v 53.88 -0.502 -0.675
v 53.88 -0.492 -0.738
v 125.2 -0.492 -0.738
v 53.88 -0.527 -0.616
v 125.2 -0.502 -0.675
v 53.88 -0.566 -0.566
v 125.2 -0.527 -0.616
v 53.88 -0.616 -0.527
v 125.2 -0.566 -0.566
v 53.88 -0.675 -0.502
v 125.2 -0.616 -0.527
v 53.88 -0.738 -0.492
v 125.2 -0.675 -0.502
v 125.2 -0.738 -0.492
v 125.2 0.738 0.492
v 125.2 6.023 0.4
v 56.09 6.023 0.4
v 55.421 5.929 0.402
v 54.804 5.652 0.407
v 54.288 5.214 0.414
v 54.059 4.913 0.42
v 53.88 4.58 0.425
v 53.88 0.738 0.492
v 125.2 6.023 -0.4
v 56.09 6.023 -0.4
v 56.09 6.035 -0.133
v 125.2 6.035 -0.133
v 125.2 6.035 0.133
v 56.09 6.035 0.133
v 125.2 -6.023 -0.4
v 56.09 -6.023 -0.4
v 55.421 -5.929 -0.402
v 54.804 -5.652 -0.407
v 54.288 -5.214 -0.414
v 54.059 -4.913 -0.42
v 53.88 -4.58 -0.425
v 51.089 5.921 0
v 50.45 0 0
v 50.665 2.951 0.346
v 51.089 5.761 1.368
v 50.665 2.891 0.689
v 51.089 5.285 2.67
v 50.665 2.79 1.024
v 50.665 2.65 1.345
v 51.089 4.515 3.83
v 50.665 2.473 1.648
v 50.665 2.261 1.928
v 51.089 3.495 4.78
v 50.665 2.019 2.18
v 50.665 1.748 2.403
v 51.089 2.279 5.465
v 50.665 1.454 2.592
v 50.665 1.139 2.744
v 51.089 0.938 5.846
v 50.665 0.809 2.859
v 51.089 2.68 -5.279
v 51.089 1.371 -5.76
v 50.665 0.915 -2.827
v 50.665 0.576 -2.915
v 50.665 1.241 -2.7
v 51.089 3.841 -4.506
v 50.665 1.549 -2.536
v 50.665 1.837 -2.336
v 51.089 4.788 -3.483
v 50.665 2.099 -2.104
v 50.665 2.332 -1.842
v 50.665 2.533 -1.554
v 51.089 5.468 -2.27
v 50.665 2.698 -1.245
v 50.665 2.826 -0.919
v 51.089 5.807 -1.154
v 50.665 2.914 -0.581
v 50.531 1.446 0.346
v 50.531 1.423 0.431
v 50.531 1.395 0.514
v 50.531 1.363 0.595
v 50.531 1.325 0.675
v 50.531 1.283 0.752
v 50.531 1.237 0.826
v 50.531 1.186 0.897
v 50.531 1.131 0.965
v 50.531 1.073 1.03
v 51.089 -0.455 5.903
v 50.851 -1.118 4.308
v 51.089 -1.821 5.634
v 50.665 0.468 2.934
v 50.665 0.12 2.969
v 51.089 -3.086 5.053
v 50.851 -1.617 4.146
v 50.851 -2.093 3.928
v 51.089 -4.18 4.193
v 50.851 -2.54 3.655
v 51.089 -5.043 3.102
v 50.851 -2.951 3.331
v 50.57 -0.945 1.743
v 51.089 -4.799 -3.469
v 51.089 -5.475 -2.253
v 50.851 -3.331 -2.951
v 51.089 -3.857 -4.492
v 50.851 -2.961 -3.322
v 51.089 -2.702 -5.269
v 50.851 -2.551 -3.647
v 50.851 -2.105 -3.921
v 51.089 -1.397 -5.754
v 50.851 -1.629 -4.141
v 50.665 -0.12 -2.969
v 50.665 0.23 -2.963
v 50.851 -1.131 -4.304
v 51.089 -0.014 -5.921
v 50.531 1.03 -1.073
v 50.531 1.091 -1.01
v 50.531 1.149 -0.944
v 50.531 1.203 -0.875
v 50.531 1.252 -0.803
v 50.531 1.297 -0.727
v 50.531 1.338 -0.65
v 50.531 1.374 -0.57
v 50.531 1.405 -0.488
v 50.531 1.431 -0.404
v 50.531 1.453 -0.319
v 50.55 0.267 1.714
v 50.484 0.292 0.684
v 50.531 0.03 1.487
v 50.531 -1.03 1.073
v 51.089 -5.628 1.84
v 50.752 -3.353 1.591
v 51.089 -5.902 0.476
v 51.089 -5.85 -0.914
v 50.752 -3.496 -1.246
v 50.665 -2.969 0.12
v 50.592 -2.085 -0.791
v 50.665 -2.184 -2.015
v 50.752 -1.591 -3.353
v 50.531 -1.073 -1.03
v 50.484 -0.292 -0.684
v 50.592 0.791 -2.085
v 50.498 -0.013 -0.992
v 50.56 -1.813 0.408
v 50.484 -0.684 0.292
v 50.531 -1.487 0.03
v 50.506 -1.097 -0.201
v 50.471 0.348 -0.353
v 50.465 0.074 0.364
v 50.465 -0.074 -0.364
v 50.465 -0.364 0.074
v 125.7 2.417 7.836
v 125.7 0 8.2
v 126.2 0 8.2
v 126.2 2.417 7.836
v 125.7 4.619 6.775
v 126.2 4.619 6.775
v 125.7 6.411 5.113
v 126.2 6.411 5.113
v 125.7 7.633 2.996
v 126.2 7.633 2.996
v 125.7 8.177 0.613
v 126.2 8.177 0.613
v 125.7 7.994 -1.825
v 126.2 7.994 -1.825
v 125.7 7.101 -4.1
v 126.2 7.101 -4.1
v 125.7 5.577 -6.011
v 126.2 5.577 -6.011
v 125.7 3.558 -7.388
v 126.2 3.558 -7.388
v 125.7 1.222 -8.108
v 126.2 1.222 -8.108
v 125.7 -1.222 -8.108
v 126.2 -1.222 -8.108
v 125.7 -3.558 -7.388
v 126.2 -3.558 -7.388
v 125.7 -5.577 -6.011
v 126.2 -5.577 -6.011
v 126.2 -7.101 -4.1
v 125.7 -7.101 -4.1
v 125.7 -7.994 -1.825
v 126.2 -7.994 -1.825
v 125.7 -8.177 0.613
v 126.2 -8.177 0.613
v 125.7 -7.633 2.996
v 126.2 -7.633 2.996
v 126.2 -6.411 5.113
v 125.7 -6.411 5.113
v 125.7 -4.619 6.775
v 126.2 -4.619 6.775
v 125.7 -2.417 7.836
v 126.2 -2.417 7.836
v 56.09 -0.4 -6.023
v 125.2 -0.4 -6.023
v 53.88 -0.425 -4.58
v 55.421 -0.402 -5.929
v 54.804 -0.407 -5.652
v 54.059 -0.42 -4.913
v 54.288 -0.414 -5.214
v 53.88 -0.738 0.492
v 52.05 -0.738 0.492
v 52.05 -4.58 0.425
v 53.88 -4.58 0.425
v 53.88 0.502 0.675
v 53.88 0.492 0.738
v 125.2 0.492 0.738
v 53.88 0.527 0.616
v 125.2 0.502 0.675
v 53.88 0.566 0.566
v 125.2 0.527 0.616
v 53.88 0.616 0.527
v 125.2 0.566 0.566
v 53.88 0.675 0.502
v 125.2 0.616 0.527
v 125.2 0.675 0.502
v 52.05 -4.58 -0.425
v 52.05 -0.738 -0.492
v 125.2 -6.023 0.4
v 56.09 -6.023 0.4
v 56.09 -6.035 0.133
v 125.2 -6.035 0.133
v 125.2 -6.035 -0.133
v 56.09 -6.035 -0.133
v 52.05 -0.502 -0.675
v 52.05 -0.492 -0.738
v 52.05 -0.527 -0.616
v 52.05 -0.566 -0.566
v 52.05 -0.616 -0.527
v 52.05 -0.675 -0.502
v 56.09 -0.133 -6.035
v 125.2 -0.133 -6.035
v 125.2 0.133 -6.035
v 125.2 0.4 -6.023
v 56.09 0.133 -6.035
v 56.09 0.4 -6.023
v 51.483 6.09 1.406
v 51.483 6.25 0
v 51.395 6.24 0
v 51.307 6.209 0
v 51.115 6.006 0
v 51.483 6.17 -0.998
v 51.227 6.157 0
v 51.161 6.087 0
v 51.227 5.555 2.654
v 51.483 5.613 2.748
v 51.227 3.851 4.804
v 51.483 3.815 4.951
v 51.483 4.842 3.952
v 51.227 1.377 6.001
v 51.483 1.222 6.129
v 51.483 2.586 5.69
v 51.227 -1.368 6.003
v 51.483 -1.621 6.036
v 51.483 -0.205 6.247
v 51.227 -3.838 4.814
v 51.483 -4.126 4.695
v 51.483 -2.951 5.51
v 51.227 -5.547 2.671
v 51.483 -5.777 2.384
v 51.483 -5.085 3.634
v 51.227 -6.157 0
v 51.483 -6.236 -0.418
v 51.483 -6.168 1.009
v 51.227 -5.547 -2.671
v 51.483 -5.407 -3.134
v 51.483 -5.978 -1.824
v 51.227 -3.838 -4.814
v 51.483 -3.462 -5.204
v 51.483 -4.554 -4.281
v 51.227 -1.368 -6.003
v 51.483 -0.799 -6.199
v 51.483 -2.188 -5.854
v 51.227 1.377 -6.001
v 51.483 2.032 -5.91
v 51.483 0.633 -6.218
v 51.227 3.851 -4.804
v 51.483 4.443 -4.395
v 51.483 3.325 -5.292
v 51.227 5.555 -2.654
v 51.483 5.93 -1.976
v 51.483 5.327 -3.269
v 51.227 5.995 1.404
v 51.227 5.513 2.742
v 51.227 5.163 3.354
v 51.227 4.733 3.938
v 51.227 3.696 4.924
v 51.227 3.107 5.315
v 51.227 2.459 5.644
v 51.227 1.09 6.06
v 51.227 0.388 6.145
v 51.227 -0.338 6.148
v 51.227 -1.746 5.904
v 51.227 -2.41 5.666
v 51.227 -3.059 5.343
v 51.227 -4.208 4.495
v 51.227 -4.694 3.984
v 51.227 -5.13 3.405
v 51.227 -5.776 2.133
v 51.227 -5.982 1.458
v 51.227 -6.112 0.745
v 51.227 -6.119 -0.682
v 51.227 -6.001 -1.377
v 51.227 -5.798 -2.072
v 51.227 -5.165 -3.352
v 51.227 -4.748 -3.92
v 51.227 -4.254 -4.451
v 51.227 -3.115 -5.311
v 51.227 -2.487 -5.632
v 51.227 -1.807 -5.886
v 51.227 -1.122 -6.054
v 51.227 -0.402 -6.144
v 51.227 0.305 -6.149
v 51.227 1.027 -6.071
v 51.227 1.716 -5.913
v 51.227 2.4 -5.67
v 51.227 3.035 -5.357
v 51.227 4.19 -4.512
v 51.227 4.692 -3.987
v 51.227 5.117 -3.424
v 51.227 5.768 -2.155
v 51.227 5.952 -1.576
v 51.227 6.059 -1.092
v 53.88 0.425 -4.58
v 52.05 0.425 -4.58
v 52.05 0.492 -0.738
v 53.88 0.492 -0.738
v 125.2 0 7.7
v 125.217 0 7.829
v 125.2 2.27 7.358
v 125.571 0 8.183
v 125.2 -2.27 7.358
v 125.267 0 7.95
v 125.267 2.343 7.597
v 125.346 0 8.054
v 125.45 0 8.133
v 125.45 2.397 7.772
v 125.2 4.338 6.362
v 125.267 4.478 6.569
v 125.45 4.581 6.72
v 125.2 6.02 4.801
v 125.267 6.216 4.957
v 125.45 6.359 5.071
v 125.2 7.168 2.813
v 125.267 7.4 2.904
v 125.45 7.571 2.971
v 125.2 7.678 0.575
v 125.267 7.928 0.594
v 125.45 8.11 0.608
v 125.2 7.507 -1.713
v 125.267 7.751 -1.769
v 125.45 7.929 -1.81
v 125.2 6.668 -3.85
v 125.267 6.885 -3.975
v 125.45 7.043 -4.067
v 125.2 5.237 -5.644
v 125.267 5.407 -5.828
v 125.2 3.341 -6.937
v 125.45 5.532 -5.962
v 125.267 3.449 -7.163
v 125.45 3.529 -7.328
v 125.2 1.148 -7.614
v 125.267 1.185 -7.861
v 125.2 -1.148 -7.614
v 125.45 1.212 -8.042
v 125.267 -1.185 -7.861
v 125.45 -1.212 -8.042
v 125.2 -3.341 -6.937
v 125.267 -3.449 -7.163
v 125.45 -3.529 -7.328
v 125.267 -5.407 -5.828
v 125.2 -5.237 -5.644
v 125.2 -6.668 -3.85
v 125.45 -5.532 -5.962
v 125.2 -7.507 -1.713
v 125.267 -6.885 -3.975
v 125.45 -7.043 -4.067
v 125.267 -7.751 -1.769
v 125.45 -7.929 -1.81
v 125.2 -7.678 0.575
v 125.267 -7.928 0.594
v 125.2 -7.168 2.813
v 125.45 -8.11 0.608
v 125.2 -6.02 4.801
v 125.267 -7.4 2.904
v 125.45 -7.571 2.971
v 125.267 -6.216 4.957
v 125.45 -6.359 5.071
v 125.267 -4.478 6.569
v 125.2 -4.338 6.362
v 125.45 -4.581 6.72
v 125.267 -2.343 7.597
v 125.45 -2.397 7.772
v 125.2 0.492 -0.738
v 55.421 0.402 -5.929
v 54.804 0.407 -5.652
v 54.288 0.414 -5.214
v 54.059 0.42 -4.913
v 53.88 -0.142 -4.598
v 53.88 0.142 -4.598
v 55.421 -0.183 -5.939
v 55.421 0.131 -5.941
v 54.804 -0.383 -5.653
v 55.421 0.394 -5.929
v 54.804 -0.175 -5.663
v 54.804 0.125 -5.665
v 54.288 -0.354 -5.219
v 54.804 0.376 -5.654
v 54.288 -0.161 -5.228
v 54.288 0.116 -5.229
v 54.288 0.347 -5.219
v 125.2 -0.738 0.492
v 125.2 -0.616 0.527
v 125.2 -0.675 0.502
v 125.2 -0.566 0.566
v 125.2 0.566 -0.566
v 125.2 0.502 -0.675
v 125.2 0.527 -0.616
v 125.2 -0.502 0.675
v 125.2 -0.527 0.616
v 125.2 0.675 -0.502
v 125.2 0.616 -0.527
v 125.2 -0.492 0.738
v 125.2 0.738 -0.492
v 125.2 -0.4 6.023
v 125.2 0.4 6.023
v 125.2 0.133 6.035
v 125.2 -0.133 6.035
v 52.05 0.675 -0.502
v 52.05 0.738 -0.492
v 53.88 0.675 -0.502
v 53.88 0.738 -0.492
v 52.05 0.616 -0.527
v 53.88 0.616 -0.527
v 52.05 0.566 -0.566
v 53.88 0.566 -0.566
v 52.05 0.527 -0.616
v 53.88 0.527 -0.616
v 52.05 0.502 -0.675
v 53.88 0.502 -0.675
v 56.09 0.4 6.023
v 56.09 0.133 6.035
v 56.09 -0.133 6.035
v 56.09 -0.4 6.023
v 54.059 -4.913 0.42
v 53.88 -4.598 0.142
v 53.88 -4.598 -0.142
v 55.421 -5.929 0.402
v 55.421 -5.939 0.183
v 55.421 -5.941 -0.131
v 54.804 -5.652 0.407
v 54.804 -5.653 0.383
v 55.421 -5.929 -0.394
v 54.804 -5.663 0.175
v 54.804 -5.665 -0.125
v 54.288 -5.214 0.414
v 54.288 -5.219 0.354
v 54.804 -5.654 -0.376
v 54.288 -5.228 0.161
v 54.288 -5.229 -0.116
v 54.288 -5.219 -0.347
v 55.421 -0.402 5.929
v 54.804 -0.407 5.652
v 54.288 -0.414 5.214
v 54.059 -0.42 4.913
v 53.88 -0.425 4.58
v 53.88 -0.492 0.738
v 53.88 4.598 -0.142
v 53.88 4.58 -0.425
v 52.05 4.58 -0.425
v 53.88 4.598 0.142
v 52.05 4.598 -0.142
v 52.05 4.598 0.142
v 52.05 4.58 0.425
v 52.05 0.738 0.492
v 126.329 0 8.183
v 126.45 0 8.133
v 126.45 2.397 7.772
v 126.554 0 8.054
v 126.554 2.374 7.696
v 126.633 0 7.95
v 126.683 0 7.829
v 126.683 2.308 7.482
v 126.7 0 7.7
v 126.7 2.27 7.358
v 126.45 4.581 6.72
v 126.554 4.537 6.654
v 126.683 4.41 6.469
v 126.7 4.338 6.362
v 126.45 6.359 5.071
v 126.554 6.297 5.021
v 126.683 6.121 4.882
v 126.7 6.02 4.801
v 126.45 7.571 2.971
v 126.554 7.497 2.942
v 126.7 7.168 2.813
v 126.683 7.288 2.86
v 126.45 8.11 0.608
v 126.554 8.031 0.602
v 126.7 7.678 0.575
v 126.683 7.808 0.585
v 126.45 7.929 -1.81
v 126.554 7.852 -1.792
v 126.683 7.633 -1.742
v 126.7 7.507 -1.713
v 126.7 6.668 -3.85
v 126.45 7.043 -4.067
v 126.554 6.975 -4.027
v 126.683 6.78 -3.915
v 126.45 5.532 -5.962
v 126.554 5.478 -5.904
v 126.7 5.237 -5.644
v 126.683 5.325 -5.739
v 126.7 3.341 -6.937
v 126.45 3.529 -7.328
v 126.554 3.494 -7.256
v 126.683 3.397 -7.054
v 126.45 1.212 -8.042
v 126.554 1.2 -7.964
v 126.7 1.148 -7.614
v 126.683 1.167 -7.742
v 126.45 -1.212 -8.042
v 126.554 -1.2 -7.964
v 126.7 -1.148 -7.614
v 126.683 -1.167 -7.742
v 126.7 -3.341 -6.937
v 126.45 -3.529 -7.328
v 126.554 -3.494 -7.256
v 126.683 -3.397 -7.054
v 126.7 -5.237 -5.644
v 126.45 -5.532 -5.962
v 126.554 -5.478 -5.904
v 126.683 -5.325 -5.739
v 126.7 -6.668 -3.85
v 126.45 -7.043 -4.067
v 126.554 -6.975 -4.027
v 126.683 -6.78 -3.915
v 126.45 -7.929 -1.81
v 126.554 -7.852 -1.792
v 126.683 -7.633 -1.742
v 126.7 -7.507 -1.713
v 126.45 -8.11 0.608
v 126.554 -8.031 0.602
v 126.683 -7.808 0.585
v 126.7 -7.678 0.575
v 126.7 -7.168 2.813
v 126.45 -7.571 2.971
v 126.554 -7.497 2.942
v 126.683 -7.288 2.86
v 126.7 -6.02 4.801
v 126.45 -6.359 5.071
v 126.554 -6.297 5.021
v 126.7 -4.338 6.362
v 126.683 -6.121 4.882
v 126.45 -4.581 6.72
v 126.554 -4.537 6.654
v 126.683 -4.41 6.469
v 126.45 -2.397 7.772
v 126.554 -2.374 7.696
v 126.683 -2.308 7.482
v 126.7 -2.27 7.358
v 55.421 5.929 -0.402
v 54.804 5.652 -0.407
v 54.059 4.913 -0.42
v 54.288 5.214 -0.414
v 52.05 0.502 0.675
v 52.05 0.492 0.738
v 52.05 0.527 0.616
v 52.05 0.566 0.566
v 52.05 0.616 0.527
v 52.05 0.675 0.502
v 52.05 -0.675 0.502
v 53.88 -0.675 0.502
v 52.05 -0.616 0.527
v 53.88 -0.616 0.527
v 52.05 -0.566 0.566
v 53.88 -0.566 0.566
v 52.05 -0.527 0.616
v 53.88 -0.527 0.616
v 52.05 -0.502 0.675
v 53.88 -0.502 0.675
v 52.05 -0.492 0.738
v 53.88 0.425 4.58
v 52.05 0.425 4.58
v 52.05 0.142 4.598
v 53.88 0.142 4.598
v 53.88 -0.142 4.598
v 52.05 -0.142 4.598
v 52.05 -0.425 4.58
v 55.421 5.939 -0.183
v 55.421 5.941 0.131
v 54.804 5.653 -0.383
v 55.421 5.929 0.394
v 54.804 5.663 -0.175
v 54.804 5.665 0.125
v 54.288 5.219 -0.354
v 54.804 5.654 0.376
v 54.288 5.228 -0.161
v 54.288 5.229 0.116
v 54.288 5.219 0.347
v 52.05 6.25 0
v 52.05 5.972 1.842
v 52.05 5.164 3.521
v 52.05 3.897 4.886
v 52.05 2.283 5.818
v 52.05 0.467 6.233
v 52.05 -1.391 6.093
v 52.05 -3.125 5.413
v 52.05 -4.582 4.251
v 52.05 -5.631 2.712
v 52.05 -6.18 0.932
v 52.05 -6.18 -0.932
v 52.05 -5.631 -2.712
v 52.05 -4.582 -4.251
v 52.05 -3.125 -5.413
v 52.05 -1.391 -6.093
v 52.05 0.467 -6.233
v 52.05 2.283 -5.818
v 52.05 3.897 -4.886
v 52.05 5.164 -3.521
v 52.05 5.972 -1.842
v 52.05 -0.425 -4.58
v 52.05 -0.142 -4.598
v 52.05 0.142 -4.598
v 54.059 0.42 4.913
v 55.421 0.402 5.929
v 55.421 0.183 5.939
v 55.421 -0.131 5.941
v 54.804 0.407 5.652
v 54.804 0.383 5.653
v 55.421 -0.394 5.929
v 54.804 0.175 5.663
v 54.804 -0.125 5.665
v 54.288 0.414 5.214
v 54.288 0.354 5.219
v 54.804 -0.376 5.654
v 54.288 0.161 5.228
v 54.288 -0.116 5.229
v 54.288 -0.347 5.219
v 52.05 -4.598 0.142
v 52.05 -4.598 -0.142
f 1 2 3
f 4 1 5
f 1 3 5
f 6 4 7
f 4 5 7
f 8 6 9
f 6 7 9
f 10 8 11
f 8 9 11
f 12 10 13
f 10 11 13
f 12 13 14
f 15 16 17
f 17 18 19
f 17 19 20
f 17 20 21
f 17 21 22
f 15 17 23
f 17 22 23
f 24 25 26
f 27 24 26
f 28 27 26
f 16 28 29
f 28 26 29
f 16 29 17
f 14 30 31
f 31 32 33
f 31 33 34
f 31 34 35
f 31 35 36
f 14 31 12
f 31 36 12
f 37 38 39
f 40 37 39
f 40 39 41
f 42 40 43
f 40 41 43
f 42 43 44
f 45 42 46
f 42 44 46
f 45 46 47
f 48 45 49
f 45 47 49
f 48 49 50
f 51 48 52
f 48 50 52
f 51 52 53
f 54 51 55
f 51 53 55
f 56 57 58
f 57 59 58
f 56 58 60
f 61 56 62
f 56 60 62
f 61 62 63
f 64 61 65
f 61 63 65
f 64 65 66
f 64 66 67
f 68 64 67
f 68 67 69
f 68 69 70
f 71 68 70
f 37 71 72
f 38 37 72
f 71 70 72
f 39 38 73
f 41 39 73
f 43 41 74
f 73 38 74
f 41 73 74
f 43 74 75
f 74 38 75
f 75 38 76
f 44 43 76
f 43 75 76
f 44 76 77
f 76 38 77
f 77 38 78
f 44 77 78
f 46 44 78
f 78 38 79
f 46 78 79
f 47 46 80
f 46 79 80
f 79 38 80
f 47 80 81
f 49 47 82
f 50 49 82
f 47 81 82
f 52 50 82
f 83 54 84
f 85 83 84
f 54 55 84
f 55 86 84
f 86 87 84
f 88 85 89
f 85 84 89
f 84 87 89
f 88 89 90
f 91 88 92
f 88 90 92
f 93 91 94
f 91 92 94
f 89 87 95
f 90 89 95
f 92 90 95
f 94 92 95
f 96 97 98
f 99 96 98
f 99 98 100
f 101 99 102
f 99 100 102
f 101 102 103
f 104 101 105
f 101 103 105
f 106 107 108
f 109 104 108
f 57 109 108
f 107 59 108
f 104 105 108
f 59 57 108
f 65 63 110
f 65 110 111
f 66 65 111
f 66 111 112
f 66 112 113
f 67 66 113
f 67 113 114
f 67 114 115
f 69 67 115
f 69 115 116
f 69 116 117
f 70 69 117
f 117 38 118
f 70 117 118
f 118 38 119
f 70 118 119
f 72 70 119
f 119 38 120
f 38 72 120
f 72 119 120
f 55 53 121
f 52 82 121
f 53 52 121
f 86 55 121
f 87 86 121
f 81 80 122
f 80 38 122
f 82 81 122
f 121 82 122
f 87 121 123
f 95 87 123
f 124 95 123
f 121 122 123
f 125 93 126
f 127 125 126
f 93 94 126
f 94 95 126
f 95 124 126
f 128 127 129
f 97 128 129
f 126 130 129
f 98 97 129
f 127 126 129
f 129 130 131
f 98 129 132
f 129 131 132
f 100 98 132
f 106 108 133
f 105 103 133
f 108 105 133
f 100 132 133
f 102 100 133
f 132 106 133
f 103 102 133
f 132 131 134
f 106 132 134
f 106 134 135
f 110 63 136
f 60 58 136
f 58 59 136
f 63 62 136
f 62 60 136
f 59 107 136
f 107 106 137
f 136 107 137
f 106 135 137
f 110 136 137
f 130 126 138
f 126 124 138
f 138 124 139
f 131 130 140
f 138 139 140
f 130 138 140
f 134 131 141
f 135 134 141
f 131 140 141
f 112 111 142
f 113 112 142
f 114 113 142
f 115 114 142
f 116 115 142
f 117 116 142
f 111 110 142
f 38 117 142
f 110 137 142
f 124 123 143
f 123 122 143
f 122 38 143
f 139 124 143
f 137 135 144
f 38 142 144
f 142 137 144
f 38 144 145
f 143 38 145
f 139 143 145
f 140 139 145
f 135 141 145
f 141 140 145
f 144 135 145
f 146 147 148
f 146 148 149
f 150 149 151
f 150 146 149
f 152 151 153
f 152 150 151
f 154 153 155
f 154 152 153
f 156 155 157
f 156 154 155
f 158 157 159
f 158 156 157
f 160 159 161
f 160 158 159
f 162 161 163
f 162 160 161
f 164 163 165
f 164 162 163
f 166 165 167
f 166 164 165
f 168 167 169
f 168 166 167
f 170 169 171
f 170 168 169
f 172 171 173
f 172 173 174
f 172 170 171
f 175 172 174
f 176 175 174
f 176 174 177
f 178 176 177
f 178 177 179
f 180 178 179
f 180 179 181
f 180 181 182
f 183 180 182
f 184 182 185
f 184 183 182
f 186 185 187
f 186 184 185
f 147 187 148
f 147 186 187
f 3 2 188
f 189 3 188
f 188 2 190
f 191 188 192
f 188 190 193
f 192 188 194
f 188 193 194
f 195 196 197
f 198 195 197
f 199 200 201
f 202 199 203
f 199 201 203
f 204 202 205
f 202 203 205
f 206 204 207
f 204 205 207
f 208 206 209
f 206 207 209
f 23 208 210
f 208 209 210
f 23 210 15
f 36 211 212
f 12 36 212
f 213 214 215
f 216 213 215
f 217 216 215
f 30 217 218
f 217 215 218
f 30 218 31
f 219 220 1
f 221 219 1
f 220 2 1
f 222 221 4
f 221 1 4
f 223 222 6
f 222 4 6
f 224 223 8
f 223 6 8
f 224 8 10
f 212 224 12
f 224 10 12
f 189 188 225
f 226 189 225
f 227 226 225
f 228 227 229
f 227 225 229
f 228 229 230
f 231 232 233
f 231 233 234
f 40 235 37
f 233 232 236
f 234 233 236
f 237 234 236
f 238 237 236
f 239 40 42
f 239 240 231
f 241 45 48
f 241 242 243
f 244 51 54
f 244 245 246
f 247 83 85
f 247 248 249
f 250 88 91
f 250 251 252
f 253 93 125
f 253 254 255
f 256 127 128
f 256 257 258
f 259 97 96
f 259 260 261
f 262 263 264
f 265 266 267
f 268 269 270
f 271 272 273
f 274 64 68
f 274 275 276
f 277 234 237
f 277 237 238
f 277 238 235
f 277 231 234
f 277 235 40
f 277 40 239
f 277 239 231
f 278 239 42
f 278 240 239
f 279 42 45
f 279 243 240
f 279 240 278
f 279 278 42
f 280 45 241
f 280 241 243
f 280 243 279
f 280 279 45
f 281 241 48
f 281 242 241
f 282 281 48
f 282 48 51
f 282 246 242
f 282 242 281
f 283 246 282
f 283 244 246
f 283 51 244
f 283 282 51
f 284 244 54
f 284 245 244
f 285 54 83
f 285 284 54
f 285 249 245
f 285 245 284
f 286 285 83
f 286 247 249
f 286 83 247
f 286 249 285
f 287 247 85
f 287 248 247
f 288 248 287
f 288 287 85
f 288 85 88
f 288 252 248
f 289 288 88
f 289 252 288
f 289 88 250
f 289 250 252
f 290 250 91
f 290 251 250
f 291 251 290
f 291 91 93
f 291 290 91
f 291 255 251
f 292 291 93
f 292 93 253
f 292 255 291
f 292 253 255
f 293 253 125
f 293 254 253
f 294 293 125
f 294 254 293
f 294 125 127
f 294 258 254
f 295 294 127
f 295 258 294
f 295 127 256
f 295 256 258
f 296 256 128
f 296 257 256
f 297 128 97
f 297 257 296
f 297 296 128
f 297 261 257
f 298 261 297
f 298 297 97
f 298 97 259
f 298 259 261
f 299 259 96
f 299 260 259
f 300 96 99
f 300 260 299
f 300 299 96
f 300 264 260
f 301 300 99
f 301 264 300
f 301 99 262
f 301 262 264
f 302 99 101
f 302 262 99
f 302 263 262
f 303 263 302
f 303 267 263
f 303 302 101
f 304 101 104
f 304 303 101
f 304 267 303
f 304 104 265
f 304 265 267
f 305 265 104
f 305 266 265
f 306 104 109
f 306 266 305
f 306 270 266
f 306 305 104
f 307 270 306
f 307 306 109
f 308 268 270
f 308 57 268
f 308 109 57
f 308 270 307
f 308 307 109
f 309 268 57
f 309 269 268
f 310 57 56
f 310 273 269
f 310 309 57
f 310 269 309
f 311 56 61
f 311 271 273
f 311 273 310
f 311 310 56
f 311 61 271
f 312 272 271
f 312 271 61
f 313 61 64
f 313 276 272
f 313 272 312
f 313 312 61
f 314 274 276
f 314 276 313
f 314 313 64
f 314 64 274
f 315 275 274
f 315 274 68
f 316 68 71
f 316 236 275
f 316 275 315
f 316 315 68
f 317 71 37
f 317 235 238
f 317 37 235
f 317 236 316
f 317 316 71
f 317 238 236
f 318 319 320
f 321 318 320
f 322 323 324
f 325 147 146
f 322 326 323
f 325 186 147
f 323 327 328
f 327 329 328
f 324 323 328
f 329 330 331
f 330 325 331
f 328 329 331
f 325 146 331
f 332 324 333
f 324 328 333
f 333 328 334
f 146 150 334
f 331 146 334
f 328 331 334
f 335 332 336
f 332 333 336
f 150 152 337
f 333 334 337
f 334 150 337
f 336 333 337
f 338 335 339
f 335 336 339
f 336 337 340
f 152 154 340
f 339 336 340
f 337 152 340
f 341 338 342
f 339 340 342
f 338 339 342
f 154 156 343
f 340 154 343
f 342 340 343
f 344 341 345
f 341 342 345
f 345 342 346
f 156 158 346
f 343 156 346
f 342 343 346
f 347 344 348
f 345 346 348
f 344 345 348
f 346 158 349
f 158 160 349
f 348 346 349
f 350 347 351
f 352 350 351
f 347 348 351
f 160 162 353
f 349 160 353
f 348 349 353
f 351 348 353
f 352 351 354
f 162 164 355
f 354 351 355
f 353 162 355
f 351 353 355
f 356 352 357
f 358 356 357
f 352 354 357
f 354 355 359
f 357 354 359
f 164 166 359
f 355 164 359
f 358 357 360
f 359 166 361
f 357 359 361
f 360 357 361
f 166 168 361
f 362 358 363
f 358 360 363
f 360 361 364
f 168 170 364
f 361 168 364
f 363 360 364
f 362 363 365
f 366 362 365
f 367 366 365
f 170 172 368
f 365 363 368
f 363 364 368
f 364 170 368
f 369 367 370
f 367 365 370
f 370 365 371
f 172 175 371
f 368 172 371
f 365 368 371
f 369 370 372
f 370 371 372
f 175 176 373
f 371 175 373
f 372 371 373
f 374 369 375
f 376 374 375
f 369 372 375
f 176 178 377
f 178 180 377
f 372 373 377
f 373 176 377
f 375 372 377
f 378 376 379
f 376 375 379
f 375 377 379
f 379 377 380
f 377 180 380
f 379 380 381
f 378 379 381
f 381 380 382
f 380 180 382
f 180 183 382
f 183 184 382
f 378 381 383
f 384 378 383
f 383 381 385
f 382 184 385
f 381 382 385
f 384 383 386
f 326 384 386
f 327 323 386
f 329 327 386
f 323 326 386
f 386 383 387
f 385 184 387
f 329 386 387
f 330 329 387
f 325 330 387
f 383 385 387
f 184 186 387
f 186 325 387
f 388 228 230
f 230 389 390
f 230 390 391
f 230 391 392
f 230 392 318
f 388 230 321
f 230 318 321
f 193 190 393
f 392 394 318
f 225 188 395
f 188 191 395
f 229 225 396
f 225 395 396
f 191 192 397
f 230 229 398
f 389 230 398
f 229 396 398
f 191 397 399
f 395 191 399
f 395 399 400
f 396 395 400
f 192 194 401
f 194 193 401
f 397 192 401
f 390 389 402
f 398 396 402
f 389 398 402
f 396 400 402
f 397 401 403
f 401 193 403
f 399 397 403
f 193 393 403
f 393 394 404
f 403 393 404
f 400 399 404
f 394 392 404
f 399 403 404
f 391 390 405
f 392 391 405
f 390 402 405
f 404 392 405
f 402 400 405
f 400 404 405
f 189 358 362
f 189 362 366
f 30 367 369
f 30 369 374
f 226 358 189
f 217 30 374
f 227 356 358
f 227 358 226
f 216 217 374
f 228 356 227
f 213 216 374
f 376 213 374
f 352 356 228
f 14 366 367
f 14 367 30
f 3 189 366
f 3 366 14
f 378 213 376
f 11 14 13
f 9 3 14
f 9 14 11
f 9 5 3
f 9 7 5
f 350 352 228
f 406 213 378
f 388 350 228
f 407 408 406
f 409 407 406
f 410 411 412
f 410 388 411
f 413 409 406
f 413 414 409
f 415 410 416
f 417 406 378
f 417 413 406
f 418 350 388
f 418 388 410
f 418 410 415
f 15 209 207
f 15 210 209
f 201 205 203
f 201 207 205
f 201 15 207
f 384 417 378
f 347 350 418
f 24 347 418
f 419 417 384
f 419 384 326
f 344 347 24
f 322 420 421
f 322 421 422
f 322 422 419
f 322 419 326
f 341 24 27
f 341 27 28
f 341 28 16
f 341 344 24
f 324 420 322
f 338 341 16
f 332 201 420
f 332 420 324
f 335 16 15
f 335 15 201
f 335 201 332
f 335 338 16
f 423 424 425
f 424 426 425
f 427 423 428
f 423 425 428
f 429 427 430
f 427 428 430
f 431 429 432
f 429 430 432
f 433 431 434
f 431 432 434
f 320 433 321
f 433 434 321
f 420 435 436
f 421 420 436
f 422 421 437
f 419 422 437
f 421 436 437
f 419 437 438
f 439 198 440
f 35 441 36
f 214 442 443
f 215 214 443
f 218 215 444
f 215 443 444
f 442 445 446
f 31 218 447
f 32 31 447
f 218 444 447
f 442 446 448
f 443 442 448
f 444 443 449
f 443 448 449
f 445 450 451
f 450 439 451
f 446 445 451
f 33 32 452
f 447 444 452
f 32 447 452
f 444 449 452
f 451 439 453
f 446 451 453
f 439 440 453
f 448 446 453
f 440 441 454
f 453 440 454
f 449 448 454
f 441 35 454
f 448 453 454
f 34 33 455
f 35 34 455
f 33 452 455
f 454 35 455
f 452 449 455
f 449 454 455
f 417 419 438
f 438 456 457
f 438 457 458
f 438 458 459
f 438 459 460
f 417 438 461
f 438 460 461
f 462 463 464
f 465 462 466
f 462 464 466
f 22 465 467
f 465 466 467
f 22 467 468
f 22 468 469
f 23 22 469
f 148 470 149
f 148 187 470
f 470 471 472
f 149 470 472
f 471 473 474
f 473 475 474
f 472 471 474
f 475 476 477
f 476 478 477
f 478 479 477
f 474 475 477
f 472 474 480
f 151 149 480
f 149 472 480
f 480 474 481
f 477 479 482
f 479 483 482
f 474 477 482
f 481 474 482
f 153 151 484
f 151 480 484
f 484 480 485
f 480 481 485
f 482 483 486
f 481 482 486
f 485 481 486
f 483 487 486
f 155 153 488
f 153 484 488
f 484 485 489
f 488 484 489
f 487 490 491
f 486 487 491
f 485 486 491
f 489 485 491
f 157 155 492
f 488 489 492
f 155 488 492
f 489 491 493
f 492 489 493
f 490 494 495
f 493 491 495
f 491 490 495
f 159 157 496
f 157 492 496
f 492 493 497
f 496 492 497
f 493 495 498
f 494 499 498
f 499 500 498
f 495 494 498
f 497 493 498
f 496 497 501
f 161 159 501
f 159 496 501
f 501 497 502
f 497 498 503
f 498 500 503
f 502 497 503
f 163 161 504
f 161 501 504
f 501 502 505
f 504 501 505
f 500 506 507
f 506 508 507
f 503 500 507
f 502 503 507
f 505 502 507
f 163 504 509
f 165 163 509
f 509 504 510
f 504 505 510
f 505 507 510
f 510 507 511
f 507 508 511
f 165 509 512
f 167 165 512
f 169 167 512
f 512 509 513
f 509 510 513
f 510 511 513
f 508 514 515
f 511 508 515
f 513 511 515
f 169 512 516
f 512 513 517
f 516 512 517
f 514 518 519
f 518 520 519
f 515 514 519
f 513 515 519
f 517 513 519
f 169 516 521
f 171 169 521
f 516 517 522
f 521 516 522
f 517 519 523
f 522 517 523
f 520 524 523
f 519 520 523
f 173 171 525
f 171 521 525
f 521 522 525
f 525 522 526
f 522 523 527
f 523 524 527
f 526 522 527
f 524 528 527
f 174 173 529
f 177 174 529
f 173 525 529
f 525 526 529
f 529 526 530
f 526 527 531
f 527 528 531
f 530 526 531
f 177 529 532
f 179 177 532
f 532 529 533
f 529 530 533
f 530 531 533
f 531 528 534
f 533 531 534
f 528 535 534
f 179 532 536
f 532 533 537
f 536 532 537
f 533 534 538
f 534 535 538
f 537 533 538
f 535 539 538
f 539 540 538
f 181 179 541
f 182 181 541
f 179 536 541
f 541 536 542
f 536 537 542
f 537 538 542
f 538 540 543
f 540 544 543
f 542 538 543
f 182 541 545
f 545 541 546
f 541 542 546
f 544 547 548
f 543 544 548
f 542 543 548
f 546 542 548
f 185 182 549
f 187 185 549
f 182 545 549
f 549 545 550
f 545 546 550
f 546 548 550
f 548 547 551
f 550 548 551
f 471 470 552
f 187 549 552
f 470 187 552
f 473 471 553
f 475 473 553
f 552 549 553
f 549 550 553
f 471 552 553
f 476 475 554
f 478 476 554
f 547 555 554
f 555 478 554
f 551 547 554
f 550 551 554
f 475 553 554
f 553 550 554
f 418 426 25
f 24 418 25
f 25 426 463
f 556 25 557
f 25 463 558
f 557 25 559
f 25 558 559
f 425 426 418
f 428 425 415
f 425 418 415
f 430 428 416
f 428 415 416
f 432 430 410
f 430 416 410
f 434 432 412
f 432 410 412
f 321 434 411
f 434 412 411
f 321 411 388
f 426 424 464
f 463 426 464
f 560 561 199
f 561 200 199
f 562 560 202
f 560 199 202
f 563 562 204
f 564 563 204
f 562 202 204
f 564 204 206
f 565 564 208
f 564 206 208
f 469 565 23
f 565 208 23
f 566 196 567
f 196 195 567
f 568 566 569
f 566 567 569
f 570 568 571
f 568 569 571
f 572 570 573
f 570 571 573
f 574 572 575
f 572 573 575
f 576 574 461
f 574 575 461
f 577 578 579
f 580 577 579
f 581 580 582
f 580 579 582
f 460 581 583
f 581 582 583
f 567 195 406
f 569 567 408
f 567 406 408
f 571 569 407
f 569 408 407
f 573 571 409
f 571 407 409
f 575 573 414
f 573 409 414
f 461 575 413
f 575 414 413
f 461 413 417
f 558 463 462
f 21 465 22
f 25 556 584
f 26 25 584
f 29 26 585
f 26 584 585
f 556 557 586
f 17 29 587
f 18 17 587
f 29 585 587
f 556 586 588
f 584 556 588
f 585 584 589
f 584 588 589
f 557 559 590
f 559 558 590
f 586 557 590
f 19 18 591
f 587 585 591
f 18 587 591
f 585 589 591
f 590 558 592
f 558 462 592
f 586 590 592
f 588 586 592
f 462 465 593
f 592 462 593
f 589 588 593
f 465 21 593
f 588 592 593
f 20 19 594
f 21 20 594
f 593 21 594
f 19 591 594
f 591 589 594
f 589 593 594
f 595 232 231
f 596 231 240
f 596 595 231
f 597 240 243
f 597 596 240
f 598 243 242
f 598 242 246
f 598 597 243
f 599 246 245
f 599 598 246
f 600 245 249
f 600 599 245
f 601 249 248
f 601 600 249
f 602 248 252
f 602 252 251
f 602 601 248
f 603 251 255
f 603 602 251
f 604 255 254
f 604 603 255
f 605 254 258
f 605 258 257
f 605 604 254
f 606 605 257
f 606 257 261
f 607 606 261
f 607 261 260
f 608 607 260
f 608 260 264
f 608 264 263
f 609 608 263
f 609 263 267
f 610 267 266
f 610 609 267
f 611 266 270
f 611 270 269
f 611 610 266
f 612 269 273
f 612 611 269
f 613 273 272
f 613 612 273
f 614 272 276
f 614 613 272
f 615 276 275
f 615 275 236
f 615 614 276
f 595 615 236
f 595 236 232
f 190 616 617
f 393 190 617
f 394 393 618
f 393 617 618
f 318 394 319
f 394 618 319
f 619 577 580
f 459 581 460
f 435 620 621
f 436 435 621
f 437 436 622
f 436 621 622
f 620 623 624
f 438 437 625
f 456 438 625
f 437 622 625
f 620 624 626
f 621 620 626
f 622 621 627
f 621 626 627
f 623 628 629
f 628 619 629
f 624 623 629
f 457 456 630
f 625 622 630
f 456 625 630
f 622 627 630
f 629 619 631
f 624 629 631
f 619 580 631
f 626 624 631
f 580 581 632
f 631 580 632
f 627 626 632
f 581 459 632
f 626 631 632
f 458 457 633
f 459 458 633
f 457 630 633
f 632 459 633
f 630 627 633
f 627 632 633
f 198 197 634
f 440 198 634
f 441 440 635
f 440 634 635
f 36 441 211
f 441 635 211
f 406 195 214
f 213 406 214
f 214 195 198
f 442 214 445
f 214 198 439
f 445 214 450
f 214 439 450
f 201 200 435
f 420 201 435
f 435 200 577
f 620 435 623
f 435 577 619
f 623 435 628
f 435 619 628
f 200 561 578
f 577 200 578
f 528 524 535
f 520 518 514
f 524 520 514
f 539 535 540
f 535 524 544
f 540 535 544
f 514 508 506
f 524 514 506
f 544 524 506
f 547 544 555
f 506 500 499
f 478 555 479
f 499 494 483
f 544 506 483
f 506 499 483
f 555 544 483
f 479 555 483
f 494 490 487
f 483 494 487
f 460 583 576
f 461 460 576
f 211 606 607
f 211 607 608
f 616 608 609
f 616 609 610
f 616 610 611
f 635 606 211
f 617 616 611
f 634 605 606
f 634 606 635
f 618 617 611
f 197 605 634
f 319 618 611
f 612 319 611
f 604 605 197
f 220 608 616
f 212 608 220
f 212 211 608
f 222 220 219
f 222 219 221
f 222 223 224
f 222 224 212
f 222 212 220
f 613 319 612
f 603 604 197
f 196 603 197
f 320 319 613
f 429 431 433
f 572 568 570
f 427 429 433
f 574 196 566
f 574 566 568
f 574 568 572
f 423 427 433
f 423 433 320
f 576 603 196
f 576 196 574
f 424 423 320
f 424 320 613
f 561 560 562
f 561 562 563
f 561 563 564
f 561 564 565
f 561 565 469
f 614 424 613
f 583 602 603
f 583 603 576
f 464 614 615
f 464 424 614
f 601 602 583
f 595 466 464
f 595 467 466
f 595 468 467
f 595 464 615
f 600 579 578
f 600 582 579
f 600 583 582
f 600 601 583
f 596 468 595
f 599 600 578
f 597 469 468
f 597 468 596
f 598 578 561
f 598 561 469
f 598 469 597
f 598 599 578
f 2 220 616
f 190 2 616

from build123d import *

# Parameters (mm, degrees)
BOSS_EXTRUDE4_START   = 53.880055185
BOSS_EXTRUDE4_2_DEPTH = 71.319944815
BOSS_EXTRUDE4_START_2 = 52.05
BOSS_EXTRUDE4_3_DEPTH = 4.040129852
SKETCH26_R            = 8.2
BOSS_EXTRUDE5_DEPTH   = 1.5
FILLET8_R             = 0.25
FILLET9_R             = 0.4
FILLET10_R            = 0.5


with BuildPart() as part:
    # Boss-Extrude4: read off the stored shape, not the designer's step
    # Boss-Extrude4 outline → Boss-Extrude4 (revolve)
    with BuildSketch(Plane.YX):
        with BuildLine():
            Line((0, 52.05), (0, 50.45))
            add(Edge.make_bspline(
                [(6.25, 51.15), (3.15111586, 50.566822676), (0, 50.45)],
                knots=[1.384782418, 1.384782418, 1.384782418, 1.533739867, 1.533739867, 1.533739867], degree=2, weights=[1, 0.997227742, 1]))
            Line((6.25, 51.15), (6.25, 52.05))
            Line((6.25, 52.05), (0, 52.05))
        make_face()
    revolve(axis=Axis((0, 0, 0), (1, 0, 0)))



with BuildPart() as body_2:
    # Boss-Extrude4 2 outline → Boss-Extrude4 2 (new body)
    with BuildSketch(Plane.YZ.offset(BOSS_EXTRUDE4_START)):
        with BuildLine():
            Line((-0.496702112, -0.496702112), (-0.40023184, -6.023480263))
            ThreePointArc((-0.40023184, -6.023480263), (0, -6.036762377), (0.40023184, -6.023480263))
            Line((0.40023184, -6.023480263), (0.496702112, -0.496702112))
            Line((0.496702112, -0.496702112), (6.023480263, -0.40023184))
            ThreePointArc((6.023480263, -0.40023184), (6.036762377, 0), (6.023480263, 0.40023184))
            Line((6.023480263, 0.40023184), (0.496702112, 0.496702112))
            Line((0.496702112, 0.496702112), (0.40023184, 6.023480263))
            ThreePointArc((0.40023184, 6.023480263), (0, 6.036762377), (-0.40023184, 6.023480263))
            Line((-0.40023184, 6.023480263), (-0.496702112, 0.496702112))
            Line((-0.496702112, 0.496702112), (-6.023480263, 0.40023184))
            ThreePointArc((-6.023480263, 0.40023184), (-6.036762377, 0), (-6.023480263, -0.40023184))
            Line((-6.023480263, -0.40023184), (-0.496702112, -0.496702112))
        make_face()
    extrude(amount=BOSS_EXTRUDE4_2_DEPTH)


with BuildPart() as part_1:
    add(part.part)

    add(body_2.part)  # Boss-Extrude4 3 merges body 2
    # Boss-Extrude4 3 outline → Boss-Extrude4 3 (add)
    with BuildSketch(Plane.YZ.offset(BOSS_EXTRUDE4_START_2)):
        with BuildLine():
            Line((-4.58028551, -0.425422898), (-0.496702112, -0.496702112))
            Line((-0.496702112, -0.496702112), (-0.425422898, -4.58028551))
            ThreePointArc((-0.425422898, -4.58028551), (0, -4.6), (0.425422898, -4.58028551))
            Line((0.425422898, -4.58028551), (0.496702112, -0.496702112))
            Line((0.496702112, -0.496702112), (4.58028551, -0.425422898))
            ThreePointArc((4.58028551, -0.425422898), (4.6, 0), (4.58028551, 0.425422898))
            Line((4.58028551, 0.425422898), (0.496702112, 0.496702112))
            Line((0.496702112, 0.496702112), (0.425422898, 4.58028551))
            ThreePointArc((0.425422898, 4.58028551), (0, 4.6), (-0.425422898, 4.58028551))
            Line((-0.425422898, 4.58028551), (-0.496702112, 0.496702112))
            Line((-0.496702112, 0.496702112), (-4.58028551, 0.425422898))
            ThreePointArc((-4.58028551, 0.425422898), (-4.6, 0), (-4.58028551, -0.425422898))
        make_face()
    extrude(amount=BOSS_EXTRUDE4_3_DEPTH)

    # Boss-Extrude4 4 outline → Boss-Extrude4 4 (revolve, cut)
    with BuildSketch(Plane.YX):
        with BuildLine():
            Line((6.036762378, 53.880055185), (6.036762377, 56.090129852))
            ThreePointArc((6.036762377, 56.090129852), (5.645999412, 54.772109014), (4.6, 53.880055286))
            Line((4.6, 53.880055286), (6.036762378, 53.880055185))
        make_face()
    revolve(axis=Axis((0, 0, 0), (1, 0, 0)), mode=Mode.SUBTRACT)

    # Sketch26 → Boss-Extrude5 (add)
    with BuildSketch(Plane.ZY.offset(-125.2)):
        Circle(SKETCH26_R)
    extrude(amount=-BOSS_EXTRUDE5_DEPTH)

    # Fillet8
    fillet8_edges = [part_1.edges().sort_by_distance(p)[0] for p in [
        (89.540027592, 0.496702112, -0.496702112),
        (89.540027592, -0.496702112, -0.496702112),
        (89.540027592, -0.496702112, 0.496702112),
        (89.540027592, 0.496702112, 0.496702112),
    ]]
    fillet(fillet8_edges, radius=FILLET8_R)

    # Fillet9
    fillet9_edges = [part_1.edges().sort_by_distance(p)[0] for p in [
        (51.15, -6.25, 0),
    ]]
    fillet(fillet9_edges, radius=FILLET9_R)

    # Fillet10
    fillet10_edges = [part_1.edges().sort_by_distance(p)[0] for p in [
        (126.7, 0, -8.2),
        (125.2, 0, -8.2),
    ]]
    fillet(fillet10_edges, radius=FILLET10_R)


solid = part_1.part
